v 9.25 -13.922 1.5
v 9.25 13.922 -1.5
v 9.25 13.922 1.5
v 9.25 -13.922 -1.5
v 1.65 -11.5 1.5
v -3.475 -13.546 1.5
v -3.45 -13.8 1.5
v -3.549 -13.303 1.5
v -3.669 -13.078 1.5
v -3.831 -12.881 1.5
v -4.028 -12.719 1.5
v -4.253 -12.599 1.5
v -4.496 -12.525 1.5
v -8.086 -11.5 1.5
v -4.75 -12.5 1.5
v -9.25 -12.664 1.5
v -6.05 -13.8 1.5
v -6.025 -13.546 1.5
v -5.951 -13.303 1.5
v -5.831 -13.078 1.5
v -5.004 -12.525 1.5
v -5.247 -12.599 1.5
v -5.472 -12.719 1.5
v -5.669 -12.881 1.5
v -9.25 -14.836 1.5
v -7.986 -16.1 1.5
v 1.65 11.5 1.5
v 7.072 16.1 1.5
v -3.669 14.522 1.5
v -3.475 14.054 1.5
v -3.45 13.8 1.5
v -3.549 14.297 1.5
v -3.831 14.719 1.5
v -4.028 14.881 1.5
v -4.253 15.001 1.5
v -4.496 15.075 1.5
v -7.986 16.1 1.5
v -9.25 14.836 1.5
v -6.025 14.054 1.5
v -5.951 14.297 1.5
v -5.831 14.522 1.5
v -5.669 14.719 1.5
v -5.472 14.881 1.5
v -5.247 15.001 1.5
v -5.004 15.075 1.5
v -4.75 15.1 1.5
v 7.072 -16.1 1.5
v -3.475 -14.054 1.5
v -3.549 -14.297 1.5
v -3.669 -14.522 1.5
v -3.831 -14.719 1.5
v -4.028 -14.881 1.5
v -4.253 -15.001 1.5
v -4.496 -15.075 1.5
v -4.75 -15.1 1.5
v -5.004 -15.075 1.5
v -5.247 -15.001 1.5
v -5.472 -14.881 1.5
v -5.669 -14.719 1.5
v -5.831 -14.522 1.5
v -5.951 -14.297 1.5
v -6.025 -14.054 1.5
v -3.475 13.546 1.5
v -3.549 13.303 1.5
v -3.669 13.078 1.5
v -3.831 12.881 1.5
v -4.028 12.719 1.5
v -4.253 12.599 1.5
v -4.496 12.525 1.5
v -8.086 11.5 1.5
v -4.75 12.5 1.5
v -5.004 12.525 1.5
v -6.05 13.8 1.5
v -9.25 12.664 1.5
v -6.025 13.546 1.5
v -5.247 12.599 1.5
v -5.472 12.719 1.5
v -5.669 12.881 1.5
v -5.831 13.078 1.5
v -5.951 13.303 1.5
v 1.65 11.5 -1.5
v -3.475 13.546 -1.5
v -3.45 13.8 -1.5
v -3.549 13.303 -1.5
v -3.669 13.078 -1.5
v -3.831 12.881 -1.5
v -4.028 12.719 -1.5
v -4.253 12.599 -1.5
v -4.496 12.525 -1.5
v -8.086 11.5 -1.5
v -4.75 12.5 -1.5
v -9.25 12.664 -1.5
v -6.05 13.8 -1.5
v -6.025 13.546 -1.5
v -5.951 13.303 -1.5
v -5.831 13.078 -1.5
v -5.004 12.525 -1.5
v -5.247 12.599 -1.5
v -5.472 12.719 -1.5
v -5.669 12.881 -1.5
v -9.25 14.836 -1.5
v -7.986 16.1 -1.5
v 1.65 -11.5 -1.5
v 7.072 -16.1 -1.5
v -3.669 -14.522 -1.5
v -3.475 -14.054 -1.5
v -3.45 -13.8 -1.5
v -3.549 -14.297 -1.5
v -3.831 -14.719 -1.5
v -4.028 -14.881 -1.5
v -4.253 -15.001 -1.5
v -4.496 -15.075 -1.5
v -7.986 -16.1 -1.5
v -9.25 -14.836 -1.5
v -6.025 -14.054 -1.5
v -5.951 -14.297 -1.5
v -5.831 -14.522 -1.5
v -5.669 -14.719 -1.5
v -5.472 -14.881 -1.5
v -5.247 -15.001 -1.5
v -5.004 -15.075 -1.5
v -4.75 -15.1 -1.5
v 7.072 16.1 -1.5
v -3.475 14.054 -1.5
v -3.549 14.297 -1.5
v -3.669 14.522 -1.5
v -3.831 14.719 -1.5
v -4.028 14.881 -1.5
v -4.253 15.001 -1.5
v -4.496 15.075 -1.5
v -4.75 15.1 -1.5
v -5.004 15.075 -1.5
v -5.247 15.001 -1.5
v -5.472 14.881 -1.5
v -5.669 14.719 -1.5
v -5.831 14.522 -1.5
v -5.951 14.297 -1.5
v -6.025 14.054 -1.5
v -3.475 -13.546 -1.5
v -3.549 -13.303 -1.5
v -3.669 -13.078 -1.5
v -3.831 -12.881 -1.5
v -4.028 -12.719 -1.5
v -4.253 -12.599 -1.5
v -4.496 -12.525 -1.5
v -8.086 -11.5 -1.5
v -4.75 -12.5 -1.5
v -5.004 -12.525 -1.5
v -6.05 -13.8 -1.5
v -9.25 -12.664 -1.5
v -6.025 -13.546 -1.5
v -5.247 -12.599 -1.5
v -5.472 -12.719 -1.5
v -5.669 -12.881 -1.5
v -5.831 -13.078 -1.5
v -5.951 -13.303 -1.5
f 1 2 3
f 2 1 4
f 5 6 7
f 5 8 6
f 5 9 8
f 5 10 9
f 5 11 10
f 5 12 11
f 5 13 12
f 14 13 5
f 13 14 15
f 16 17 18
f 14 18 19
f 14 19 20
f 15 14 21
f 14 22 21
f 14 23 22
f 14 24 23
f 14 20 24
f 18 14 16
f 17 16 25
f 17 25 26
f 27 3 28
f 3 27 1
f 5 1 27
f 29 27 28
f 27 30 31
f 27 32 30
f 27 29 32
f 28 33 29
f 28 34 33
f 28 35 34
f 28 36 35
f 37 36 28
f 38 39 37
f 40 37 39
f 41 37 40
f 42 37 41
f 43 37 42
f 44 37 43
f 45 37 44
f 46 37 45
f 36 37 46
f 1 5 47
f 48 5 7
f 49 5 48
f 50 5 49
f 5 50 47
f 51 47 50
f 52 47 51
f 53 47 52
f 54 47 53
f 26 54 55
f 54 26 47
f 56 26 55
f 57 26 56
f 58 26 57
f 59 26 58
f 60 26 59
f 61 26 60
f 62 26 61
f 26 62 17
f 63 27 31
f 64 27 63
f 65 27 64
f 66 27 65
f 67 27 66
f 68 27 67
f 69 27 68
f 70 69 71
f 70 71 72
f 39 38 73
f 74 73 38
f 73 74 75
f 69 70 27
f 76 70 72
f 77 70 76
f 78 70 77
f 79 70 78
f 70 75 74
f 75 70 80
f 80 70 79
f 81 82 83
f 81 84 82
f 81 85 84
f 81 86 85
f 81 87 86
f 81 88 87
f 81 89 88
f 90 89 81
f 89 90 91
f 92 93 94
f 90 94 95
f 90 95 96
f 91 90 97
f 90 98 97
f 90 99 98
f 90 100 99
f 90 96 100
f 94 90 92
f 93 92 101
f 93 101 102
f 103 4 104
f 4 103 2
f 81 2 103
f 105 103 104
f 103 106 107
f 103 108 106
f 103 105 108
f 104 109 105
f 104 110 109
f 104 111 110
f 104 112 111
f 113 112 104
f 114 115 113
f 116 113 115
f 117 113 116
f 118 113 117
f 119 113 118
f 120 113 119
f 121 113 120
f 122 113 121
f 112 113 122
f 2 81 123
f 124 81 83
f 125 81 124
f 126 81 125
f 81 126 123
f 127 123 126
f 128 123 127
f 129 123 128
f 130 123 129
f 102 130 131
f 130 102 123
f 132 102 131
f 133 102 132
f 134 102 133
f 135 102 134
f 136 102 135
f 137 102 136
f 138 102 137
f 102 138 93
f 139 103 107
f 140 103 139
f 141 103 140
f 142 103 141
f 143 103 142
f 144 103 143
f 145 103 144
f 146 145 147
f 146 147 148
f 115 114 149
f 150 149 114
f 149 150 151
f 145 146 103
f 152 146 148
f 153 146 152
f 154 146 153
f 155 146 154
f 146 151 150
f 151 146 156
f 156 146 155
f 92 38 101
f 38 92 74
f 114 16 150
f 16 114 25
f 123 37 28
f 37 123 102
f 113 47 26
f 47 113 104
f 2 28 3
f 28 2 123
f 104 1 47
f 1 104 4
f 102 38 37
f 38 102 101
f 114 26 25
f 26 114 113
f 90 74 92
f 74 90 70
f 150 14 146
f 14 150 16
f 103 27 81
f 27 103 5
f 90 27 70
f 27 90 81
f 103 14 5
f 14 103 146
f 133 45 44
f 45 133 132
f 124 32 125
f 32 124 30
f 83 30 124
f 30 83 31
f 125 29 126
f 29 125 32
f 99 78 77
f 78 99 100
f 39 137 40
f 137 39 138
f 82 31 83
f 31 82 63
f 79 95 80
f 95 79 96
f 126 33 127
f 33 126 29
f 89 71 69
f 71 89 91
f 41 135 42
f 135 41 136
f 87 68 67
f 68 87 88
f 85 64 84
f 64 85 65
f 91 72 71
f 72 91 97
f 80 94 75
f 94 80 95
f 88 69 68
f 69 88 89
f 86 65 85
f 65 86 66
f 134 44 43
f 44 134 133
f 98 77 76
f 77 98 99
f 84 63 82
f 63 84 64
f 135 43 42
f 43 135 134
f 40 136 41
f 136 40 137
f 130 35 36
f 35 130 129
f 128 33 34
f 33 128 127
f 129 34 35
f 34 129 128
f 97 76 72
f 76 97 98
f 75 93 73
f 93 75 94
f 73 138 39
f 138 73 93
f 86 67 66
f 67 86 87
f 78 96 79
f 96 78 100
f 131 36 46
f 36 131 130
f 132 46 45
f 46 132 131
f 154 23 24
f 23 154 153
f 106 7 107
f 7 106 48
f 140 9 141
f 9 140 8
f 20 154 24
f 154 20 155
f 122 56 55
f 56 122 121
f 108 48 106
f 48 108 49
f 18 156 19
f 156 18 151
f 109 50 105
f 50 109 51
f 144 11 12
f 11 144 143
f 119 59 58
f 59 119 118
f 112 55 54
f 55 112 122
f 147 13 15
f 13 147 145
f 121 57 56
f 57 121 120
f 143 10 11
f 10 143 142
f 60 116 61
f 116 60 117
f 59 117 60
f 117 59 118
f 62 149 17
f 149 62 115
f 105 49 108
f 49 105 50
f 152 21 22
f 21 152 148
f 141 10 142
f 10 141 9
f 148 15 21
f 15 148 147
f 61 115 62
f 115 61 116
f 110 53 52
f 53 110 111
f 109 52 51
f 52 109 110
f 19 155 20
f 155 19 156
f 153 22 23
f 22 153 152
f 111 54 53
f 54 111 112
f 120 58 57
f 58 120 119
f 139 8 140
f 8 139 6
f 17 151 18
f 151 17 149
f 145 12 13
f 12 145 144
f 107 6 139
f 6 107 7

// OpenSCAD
$fn=32;

d_screw_m2 = 2.6+0.3+0.2;
d_screw_m3 = 3.6+0.3;
d_side_hole = 1.6;
r_horn = 12.3+0.5;
  w_base=40;
  h_base=3;
  w_servo=12.1;
  h_servo = 16 + 0.5;
  wc_block = 16.5;
  
  w_left_edge = wc_block - w_servo;
  shift_left_edge = w_servo/2 + w_left_edge/2;
  shift_x_hole = shift_left_edge;
  shift_y_hole = w_servo/2;

  shift_wc_block = 2.4;

module init_holder_sizes() {
d_screw_m2 = 2.6+0.3+0.2;
d_screw_m3 = 3.6+0.3;
d_side_hole = 1.6;
r_horn = 12.3+0.5;
  w_base=40;
  h_base=3;
  w_servo=12.1;
  h_servo = 16 + 0.5;
  wc_block = 16.5;
  
  w_left_edge = wc_block - w_servo;
  shift_left_edge = w_servo/2 + w_left_edge/2;
  shift_x_hole = shift_left_edge;
  shift_y_hole = w_servo/2;

  shift_wc_block = 2.4;
}

module holder() {
    difference(){
    cube([16.5+2, 32.2, 3],true);
    translate([9+1,15+1,0]) rotate(a=[0,0,45]) cube([4,14,5],true);
    mirror([0,1,0])
        translate([9+1,15+1,0]) rotate(a=[0,0,45]) cube([4,14,5],true);
    translate([-8-0.5,16.5+0.5,0]) rotate(a=[0,0,45]) cube([3+3,2,5],true);
    mirror([0,1,0])
        translate([-8-0.5,16.5+0.5,0]) rotate(a=[0,0,45]) cube([3+3,2,5],true);
        translate([-8-0.5,11-0.5,0]) rotate(a=[0,0,315]) cube([3+3,2,5],true);
    mirror([0,1,0])
        translate([-8-0.5,11-0.5,0]) rotate(a=[0,0,315]) cube([3+3,2,5],true);
       
    translate([-2.4-2,0,0]) cube([12.1,23,5],true);
    translate([-2.35-shift_wc_block,13.8,0])cylinder(h=5, r=1+0.3, center=true);
    mirror([0,1,0])
    translate([-2.35-shift_wc_block,13.8,0])cylinder(h=5, r=1+0.3, center=true);    
    }
}

 
holder();
